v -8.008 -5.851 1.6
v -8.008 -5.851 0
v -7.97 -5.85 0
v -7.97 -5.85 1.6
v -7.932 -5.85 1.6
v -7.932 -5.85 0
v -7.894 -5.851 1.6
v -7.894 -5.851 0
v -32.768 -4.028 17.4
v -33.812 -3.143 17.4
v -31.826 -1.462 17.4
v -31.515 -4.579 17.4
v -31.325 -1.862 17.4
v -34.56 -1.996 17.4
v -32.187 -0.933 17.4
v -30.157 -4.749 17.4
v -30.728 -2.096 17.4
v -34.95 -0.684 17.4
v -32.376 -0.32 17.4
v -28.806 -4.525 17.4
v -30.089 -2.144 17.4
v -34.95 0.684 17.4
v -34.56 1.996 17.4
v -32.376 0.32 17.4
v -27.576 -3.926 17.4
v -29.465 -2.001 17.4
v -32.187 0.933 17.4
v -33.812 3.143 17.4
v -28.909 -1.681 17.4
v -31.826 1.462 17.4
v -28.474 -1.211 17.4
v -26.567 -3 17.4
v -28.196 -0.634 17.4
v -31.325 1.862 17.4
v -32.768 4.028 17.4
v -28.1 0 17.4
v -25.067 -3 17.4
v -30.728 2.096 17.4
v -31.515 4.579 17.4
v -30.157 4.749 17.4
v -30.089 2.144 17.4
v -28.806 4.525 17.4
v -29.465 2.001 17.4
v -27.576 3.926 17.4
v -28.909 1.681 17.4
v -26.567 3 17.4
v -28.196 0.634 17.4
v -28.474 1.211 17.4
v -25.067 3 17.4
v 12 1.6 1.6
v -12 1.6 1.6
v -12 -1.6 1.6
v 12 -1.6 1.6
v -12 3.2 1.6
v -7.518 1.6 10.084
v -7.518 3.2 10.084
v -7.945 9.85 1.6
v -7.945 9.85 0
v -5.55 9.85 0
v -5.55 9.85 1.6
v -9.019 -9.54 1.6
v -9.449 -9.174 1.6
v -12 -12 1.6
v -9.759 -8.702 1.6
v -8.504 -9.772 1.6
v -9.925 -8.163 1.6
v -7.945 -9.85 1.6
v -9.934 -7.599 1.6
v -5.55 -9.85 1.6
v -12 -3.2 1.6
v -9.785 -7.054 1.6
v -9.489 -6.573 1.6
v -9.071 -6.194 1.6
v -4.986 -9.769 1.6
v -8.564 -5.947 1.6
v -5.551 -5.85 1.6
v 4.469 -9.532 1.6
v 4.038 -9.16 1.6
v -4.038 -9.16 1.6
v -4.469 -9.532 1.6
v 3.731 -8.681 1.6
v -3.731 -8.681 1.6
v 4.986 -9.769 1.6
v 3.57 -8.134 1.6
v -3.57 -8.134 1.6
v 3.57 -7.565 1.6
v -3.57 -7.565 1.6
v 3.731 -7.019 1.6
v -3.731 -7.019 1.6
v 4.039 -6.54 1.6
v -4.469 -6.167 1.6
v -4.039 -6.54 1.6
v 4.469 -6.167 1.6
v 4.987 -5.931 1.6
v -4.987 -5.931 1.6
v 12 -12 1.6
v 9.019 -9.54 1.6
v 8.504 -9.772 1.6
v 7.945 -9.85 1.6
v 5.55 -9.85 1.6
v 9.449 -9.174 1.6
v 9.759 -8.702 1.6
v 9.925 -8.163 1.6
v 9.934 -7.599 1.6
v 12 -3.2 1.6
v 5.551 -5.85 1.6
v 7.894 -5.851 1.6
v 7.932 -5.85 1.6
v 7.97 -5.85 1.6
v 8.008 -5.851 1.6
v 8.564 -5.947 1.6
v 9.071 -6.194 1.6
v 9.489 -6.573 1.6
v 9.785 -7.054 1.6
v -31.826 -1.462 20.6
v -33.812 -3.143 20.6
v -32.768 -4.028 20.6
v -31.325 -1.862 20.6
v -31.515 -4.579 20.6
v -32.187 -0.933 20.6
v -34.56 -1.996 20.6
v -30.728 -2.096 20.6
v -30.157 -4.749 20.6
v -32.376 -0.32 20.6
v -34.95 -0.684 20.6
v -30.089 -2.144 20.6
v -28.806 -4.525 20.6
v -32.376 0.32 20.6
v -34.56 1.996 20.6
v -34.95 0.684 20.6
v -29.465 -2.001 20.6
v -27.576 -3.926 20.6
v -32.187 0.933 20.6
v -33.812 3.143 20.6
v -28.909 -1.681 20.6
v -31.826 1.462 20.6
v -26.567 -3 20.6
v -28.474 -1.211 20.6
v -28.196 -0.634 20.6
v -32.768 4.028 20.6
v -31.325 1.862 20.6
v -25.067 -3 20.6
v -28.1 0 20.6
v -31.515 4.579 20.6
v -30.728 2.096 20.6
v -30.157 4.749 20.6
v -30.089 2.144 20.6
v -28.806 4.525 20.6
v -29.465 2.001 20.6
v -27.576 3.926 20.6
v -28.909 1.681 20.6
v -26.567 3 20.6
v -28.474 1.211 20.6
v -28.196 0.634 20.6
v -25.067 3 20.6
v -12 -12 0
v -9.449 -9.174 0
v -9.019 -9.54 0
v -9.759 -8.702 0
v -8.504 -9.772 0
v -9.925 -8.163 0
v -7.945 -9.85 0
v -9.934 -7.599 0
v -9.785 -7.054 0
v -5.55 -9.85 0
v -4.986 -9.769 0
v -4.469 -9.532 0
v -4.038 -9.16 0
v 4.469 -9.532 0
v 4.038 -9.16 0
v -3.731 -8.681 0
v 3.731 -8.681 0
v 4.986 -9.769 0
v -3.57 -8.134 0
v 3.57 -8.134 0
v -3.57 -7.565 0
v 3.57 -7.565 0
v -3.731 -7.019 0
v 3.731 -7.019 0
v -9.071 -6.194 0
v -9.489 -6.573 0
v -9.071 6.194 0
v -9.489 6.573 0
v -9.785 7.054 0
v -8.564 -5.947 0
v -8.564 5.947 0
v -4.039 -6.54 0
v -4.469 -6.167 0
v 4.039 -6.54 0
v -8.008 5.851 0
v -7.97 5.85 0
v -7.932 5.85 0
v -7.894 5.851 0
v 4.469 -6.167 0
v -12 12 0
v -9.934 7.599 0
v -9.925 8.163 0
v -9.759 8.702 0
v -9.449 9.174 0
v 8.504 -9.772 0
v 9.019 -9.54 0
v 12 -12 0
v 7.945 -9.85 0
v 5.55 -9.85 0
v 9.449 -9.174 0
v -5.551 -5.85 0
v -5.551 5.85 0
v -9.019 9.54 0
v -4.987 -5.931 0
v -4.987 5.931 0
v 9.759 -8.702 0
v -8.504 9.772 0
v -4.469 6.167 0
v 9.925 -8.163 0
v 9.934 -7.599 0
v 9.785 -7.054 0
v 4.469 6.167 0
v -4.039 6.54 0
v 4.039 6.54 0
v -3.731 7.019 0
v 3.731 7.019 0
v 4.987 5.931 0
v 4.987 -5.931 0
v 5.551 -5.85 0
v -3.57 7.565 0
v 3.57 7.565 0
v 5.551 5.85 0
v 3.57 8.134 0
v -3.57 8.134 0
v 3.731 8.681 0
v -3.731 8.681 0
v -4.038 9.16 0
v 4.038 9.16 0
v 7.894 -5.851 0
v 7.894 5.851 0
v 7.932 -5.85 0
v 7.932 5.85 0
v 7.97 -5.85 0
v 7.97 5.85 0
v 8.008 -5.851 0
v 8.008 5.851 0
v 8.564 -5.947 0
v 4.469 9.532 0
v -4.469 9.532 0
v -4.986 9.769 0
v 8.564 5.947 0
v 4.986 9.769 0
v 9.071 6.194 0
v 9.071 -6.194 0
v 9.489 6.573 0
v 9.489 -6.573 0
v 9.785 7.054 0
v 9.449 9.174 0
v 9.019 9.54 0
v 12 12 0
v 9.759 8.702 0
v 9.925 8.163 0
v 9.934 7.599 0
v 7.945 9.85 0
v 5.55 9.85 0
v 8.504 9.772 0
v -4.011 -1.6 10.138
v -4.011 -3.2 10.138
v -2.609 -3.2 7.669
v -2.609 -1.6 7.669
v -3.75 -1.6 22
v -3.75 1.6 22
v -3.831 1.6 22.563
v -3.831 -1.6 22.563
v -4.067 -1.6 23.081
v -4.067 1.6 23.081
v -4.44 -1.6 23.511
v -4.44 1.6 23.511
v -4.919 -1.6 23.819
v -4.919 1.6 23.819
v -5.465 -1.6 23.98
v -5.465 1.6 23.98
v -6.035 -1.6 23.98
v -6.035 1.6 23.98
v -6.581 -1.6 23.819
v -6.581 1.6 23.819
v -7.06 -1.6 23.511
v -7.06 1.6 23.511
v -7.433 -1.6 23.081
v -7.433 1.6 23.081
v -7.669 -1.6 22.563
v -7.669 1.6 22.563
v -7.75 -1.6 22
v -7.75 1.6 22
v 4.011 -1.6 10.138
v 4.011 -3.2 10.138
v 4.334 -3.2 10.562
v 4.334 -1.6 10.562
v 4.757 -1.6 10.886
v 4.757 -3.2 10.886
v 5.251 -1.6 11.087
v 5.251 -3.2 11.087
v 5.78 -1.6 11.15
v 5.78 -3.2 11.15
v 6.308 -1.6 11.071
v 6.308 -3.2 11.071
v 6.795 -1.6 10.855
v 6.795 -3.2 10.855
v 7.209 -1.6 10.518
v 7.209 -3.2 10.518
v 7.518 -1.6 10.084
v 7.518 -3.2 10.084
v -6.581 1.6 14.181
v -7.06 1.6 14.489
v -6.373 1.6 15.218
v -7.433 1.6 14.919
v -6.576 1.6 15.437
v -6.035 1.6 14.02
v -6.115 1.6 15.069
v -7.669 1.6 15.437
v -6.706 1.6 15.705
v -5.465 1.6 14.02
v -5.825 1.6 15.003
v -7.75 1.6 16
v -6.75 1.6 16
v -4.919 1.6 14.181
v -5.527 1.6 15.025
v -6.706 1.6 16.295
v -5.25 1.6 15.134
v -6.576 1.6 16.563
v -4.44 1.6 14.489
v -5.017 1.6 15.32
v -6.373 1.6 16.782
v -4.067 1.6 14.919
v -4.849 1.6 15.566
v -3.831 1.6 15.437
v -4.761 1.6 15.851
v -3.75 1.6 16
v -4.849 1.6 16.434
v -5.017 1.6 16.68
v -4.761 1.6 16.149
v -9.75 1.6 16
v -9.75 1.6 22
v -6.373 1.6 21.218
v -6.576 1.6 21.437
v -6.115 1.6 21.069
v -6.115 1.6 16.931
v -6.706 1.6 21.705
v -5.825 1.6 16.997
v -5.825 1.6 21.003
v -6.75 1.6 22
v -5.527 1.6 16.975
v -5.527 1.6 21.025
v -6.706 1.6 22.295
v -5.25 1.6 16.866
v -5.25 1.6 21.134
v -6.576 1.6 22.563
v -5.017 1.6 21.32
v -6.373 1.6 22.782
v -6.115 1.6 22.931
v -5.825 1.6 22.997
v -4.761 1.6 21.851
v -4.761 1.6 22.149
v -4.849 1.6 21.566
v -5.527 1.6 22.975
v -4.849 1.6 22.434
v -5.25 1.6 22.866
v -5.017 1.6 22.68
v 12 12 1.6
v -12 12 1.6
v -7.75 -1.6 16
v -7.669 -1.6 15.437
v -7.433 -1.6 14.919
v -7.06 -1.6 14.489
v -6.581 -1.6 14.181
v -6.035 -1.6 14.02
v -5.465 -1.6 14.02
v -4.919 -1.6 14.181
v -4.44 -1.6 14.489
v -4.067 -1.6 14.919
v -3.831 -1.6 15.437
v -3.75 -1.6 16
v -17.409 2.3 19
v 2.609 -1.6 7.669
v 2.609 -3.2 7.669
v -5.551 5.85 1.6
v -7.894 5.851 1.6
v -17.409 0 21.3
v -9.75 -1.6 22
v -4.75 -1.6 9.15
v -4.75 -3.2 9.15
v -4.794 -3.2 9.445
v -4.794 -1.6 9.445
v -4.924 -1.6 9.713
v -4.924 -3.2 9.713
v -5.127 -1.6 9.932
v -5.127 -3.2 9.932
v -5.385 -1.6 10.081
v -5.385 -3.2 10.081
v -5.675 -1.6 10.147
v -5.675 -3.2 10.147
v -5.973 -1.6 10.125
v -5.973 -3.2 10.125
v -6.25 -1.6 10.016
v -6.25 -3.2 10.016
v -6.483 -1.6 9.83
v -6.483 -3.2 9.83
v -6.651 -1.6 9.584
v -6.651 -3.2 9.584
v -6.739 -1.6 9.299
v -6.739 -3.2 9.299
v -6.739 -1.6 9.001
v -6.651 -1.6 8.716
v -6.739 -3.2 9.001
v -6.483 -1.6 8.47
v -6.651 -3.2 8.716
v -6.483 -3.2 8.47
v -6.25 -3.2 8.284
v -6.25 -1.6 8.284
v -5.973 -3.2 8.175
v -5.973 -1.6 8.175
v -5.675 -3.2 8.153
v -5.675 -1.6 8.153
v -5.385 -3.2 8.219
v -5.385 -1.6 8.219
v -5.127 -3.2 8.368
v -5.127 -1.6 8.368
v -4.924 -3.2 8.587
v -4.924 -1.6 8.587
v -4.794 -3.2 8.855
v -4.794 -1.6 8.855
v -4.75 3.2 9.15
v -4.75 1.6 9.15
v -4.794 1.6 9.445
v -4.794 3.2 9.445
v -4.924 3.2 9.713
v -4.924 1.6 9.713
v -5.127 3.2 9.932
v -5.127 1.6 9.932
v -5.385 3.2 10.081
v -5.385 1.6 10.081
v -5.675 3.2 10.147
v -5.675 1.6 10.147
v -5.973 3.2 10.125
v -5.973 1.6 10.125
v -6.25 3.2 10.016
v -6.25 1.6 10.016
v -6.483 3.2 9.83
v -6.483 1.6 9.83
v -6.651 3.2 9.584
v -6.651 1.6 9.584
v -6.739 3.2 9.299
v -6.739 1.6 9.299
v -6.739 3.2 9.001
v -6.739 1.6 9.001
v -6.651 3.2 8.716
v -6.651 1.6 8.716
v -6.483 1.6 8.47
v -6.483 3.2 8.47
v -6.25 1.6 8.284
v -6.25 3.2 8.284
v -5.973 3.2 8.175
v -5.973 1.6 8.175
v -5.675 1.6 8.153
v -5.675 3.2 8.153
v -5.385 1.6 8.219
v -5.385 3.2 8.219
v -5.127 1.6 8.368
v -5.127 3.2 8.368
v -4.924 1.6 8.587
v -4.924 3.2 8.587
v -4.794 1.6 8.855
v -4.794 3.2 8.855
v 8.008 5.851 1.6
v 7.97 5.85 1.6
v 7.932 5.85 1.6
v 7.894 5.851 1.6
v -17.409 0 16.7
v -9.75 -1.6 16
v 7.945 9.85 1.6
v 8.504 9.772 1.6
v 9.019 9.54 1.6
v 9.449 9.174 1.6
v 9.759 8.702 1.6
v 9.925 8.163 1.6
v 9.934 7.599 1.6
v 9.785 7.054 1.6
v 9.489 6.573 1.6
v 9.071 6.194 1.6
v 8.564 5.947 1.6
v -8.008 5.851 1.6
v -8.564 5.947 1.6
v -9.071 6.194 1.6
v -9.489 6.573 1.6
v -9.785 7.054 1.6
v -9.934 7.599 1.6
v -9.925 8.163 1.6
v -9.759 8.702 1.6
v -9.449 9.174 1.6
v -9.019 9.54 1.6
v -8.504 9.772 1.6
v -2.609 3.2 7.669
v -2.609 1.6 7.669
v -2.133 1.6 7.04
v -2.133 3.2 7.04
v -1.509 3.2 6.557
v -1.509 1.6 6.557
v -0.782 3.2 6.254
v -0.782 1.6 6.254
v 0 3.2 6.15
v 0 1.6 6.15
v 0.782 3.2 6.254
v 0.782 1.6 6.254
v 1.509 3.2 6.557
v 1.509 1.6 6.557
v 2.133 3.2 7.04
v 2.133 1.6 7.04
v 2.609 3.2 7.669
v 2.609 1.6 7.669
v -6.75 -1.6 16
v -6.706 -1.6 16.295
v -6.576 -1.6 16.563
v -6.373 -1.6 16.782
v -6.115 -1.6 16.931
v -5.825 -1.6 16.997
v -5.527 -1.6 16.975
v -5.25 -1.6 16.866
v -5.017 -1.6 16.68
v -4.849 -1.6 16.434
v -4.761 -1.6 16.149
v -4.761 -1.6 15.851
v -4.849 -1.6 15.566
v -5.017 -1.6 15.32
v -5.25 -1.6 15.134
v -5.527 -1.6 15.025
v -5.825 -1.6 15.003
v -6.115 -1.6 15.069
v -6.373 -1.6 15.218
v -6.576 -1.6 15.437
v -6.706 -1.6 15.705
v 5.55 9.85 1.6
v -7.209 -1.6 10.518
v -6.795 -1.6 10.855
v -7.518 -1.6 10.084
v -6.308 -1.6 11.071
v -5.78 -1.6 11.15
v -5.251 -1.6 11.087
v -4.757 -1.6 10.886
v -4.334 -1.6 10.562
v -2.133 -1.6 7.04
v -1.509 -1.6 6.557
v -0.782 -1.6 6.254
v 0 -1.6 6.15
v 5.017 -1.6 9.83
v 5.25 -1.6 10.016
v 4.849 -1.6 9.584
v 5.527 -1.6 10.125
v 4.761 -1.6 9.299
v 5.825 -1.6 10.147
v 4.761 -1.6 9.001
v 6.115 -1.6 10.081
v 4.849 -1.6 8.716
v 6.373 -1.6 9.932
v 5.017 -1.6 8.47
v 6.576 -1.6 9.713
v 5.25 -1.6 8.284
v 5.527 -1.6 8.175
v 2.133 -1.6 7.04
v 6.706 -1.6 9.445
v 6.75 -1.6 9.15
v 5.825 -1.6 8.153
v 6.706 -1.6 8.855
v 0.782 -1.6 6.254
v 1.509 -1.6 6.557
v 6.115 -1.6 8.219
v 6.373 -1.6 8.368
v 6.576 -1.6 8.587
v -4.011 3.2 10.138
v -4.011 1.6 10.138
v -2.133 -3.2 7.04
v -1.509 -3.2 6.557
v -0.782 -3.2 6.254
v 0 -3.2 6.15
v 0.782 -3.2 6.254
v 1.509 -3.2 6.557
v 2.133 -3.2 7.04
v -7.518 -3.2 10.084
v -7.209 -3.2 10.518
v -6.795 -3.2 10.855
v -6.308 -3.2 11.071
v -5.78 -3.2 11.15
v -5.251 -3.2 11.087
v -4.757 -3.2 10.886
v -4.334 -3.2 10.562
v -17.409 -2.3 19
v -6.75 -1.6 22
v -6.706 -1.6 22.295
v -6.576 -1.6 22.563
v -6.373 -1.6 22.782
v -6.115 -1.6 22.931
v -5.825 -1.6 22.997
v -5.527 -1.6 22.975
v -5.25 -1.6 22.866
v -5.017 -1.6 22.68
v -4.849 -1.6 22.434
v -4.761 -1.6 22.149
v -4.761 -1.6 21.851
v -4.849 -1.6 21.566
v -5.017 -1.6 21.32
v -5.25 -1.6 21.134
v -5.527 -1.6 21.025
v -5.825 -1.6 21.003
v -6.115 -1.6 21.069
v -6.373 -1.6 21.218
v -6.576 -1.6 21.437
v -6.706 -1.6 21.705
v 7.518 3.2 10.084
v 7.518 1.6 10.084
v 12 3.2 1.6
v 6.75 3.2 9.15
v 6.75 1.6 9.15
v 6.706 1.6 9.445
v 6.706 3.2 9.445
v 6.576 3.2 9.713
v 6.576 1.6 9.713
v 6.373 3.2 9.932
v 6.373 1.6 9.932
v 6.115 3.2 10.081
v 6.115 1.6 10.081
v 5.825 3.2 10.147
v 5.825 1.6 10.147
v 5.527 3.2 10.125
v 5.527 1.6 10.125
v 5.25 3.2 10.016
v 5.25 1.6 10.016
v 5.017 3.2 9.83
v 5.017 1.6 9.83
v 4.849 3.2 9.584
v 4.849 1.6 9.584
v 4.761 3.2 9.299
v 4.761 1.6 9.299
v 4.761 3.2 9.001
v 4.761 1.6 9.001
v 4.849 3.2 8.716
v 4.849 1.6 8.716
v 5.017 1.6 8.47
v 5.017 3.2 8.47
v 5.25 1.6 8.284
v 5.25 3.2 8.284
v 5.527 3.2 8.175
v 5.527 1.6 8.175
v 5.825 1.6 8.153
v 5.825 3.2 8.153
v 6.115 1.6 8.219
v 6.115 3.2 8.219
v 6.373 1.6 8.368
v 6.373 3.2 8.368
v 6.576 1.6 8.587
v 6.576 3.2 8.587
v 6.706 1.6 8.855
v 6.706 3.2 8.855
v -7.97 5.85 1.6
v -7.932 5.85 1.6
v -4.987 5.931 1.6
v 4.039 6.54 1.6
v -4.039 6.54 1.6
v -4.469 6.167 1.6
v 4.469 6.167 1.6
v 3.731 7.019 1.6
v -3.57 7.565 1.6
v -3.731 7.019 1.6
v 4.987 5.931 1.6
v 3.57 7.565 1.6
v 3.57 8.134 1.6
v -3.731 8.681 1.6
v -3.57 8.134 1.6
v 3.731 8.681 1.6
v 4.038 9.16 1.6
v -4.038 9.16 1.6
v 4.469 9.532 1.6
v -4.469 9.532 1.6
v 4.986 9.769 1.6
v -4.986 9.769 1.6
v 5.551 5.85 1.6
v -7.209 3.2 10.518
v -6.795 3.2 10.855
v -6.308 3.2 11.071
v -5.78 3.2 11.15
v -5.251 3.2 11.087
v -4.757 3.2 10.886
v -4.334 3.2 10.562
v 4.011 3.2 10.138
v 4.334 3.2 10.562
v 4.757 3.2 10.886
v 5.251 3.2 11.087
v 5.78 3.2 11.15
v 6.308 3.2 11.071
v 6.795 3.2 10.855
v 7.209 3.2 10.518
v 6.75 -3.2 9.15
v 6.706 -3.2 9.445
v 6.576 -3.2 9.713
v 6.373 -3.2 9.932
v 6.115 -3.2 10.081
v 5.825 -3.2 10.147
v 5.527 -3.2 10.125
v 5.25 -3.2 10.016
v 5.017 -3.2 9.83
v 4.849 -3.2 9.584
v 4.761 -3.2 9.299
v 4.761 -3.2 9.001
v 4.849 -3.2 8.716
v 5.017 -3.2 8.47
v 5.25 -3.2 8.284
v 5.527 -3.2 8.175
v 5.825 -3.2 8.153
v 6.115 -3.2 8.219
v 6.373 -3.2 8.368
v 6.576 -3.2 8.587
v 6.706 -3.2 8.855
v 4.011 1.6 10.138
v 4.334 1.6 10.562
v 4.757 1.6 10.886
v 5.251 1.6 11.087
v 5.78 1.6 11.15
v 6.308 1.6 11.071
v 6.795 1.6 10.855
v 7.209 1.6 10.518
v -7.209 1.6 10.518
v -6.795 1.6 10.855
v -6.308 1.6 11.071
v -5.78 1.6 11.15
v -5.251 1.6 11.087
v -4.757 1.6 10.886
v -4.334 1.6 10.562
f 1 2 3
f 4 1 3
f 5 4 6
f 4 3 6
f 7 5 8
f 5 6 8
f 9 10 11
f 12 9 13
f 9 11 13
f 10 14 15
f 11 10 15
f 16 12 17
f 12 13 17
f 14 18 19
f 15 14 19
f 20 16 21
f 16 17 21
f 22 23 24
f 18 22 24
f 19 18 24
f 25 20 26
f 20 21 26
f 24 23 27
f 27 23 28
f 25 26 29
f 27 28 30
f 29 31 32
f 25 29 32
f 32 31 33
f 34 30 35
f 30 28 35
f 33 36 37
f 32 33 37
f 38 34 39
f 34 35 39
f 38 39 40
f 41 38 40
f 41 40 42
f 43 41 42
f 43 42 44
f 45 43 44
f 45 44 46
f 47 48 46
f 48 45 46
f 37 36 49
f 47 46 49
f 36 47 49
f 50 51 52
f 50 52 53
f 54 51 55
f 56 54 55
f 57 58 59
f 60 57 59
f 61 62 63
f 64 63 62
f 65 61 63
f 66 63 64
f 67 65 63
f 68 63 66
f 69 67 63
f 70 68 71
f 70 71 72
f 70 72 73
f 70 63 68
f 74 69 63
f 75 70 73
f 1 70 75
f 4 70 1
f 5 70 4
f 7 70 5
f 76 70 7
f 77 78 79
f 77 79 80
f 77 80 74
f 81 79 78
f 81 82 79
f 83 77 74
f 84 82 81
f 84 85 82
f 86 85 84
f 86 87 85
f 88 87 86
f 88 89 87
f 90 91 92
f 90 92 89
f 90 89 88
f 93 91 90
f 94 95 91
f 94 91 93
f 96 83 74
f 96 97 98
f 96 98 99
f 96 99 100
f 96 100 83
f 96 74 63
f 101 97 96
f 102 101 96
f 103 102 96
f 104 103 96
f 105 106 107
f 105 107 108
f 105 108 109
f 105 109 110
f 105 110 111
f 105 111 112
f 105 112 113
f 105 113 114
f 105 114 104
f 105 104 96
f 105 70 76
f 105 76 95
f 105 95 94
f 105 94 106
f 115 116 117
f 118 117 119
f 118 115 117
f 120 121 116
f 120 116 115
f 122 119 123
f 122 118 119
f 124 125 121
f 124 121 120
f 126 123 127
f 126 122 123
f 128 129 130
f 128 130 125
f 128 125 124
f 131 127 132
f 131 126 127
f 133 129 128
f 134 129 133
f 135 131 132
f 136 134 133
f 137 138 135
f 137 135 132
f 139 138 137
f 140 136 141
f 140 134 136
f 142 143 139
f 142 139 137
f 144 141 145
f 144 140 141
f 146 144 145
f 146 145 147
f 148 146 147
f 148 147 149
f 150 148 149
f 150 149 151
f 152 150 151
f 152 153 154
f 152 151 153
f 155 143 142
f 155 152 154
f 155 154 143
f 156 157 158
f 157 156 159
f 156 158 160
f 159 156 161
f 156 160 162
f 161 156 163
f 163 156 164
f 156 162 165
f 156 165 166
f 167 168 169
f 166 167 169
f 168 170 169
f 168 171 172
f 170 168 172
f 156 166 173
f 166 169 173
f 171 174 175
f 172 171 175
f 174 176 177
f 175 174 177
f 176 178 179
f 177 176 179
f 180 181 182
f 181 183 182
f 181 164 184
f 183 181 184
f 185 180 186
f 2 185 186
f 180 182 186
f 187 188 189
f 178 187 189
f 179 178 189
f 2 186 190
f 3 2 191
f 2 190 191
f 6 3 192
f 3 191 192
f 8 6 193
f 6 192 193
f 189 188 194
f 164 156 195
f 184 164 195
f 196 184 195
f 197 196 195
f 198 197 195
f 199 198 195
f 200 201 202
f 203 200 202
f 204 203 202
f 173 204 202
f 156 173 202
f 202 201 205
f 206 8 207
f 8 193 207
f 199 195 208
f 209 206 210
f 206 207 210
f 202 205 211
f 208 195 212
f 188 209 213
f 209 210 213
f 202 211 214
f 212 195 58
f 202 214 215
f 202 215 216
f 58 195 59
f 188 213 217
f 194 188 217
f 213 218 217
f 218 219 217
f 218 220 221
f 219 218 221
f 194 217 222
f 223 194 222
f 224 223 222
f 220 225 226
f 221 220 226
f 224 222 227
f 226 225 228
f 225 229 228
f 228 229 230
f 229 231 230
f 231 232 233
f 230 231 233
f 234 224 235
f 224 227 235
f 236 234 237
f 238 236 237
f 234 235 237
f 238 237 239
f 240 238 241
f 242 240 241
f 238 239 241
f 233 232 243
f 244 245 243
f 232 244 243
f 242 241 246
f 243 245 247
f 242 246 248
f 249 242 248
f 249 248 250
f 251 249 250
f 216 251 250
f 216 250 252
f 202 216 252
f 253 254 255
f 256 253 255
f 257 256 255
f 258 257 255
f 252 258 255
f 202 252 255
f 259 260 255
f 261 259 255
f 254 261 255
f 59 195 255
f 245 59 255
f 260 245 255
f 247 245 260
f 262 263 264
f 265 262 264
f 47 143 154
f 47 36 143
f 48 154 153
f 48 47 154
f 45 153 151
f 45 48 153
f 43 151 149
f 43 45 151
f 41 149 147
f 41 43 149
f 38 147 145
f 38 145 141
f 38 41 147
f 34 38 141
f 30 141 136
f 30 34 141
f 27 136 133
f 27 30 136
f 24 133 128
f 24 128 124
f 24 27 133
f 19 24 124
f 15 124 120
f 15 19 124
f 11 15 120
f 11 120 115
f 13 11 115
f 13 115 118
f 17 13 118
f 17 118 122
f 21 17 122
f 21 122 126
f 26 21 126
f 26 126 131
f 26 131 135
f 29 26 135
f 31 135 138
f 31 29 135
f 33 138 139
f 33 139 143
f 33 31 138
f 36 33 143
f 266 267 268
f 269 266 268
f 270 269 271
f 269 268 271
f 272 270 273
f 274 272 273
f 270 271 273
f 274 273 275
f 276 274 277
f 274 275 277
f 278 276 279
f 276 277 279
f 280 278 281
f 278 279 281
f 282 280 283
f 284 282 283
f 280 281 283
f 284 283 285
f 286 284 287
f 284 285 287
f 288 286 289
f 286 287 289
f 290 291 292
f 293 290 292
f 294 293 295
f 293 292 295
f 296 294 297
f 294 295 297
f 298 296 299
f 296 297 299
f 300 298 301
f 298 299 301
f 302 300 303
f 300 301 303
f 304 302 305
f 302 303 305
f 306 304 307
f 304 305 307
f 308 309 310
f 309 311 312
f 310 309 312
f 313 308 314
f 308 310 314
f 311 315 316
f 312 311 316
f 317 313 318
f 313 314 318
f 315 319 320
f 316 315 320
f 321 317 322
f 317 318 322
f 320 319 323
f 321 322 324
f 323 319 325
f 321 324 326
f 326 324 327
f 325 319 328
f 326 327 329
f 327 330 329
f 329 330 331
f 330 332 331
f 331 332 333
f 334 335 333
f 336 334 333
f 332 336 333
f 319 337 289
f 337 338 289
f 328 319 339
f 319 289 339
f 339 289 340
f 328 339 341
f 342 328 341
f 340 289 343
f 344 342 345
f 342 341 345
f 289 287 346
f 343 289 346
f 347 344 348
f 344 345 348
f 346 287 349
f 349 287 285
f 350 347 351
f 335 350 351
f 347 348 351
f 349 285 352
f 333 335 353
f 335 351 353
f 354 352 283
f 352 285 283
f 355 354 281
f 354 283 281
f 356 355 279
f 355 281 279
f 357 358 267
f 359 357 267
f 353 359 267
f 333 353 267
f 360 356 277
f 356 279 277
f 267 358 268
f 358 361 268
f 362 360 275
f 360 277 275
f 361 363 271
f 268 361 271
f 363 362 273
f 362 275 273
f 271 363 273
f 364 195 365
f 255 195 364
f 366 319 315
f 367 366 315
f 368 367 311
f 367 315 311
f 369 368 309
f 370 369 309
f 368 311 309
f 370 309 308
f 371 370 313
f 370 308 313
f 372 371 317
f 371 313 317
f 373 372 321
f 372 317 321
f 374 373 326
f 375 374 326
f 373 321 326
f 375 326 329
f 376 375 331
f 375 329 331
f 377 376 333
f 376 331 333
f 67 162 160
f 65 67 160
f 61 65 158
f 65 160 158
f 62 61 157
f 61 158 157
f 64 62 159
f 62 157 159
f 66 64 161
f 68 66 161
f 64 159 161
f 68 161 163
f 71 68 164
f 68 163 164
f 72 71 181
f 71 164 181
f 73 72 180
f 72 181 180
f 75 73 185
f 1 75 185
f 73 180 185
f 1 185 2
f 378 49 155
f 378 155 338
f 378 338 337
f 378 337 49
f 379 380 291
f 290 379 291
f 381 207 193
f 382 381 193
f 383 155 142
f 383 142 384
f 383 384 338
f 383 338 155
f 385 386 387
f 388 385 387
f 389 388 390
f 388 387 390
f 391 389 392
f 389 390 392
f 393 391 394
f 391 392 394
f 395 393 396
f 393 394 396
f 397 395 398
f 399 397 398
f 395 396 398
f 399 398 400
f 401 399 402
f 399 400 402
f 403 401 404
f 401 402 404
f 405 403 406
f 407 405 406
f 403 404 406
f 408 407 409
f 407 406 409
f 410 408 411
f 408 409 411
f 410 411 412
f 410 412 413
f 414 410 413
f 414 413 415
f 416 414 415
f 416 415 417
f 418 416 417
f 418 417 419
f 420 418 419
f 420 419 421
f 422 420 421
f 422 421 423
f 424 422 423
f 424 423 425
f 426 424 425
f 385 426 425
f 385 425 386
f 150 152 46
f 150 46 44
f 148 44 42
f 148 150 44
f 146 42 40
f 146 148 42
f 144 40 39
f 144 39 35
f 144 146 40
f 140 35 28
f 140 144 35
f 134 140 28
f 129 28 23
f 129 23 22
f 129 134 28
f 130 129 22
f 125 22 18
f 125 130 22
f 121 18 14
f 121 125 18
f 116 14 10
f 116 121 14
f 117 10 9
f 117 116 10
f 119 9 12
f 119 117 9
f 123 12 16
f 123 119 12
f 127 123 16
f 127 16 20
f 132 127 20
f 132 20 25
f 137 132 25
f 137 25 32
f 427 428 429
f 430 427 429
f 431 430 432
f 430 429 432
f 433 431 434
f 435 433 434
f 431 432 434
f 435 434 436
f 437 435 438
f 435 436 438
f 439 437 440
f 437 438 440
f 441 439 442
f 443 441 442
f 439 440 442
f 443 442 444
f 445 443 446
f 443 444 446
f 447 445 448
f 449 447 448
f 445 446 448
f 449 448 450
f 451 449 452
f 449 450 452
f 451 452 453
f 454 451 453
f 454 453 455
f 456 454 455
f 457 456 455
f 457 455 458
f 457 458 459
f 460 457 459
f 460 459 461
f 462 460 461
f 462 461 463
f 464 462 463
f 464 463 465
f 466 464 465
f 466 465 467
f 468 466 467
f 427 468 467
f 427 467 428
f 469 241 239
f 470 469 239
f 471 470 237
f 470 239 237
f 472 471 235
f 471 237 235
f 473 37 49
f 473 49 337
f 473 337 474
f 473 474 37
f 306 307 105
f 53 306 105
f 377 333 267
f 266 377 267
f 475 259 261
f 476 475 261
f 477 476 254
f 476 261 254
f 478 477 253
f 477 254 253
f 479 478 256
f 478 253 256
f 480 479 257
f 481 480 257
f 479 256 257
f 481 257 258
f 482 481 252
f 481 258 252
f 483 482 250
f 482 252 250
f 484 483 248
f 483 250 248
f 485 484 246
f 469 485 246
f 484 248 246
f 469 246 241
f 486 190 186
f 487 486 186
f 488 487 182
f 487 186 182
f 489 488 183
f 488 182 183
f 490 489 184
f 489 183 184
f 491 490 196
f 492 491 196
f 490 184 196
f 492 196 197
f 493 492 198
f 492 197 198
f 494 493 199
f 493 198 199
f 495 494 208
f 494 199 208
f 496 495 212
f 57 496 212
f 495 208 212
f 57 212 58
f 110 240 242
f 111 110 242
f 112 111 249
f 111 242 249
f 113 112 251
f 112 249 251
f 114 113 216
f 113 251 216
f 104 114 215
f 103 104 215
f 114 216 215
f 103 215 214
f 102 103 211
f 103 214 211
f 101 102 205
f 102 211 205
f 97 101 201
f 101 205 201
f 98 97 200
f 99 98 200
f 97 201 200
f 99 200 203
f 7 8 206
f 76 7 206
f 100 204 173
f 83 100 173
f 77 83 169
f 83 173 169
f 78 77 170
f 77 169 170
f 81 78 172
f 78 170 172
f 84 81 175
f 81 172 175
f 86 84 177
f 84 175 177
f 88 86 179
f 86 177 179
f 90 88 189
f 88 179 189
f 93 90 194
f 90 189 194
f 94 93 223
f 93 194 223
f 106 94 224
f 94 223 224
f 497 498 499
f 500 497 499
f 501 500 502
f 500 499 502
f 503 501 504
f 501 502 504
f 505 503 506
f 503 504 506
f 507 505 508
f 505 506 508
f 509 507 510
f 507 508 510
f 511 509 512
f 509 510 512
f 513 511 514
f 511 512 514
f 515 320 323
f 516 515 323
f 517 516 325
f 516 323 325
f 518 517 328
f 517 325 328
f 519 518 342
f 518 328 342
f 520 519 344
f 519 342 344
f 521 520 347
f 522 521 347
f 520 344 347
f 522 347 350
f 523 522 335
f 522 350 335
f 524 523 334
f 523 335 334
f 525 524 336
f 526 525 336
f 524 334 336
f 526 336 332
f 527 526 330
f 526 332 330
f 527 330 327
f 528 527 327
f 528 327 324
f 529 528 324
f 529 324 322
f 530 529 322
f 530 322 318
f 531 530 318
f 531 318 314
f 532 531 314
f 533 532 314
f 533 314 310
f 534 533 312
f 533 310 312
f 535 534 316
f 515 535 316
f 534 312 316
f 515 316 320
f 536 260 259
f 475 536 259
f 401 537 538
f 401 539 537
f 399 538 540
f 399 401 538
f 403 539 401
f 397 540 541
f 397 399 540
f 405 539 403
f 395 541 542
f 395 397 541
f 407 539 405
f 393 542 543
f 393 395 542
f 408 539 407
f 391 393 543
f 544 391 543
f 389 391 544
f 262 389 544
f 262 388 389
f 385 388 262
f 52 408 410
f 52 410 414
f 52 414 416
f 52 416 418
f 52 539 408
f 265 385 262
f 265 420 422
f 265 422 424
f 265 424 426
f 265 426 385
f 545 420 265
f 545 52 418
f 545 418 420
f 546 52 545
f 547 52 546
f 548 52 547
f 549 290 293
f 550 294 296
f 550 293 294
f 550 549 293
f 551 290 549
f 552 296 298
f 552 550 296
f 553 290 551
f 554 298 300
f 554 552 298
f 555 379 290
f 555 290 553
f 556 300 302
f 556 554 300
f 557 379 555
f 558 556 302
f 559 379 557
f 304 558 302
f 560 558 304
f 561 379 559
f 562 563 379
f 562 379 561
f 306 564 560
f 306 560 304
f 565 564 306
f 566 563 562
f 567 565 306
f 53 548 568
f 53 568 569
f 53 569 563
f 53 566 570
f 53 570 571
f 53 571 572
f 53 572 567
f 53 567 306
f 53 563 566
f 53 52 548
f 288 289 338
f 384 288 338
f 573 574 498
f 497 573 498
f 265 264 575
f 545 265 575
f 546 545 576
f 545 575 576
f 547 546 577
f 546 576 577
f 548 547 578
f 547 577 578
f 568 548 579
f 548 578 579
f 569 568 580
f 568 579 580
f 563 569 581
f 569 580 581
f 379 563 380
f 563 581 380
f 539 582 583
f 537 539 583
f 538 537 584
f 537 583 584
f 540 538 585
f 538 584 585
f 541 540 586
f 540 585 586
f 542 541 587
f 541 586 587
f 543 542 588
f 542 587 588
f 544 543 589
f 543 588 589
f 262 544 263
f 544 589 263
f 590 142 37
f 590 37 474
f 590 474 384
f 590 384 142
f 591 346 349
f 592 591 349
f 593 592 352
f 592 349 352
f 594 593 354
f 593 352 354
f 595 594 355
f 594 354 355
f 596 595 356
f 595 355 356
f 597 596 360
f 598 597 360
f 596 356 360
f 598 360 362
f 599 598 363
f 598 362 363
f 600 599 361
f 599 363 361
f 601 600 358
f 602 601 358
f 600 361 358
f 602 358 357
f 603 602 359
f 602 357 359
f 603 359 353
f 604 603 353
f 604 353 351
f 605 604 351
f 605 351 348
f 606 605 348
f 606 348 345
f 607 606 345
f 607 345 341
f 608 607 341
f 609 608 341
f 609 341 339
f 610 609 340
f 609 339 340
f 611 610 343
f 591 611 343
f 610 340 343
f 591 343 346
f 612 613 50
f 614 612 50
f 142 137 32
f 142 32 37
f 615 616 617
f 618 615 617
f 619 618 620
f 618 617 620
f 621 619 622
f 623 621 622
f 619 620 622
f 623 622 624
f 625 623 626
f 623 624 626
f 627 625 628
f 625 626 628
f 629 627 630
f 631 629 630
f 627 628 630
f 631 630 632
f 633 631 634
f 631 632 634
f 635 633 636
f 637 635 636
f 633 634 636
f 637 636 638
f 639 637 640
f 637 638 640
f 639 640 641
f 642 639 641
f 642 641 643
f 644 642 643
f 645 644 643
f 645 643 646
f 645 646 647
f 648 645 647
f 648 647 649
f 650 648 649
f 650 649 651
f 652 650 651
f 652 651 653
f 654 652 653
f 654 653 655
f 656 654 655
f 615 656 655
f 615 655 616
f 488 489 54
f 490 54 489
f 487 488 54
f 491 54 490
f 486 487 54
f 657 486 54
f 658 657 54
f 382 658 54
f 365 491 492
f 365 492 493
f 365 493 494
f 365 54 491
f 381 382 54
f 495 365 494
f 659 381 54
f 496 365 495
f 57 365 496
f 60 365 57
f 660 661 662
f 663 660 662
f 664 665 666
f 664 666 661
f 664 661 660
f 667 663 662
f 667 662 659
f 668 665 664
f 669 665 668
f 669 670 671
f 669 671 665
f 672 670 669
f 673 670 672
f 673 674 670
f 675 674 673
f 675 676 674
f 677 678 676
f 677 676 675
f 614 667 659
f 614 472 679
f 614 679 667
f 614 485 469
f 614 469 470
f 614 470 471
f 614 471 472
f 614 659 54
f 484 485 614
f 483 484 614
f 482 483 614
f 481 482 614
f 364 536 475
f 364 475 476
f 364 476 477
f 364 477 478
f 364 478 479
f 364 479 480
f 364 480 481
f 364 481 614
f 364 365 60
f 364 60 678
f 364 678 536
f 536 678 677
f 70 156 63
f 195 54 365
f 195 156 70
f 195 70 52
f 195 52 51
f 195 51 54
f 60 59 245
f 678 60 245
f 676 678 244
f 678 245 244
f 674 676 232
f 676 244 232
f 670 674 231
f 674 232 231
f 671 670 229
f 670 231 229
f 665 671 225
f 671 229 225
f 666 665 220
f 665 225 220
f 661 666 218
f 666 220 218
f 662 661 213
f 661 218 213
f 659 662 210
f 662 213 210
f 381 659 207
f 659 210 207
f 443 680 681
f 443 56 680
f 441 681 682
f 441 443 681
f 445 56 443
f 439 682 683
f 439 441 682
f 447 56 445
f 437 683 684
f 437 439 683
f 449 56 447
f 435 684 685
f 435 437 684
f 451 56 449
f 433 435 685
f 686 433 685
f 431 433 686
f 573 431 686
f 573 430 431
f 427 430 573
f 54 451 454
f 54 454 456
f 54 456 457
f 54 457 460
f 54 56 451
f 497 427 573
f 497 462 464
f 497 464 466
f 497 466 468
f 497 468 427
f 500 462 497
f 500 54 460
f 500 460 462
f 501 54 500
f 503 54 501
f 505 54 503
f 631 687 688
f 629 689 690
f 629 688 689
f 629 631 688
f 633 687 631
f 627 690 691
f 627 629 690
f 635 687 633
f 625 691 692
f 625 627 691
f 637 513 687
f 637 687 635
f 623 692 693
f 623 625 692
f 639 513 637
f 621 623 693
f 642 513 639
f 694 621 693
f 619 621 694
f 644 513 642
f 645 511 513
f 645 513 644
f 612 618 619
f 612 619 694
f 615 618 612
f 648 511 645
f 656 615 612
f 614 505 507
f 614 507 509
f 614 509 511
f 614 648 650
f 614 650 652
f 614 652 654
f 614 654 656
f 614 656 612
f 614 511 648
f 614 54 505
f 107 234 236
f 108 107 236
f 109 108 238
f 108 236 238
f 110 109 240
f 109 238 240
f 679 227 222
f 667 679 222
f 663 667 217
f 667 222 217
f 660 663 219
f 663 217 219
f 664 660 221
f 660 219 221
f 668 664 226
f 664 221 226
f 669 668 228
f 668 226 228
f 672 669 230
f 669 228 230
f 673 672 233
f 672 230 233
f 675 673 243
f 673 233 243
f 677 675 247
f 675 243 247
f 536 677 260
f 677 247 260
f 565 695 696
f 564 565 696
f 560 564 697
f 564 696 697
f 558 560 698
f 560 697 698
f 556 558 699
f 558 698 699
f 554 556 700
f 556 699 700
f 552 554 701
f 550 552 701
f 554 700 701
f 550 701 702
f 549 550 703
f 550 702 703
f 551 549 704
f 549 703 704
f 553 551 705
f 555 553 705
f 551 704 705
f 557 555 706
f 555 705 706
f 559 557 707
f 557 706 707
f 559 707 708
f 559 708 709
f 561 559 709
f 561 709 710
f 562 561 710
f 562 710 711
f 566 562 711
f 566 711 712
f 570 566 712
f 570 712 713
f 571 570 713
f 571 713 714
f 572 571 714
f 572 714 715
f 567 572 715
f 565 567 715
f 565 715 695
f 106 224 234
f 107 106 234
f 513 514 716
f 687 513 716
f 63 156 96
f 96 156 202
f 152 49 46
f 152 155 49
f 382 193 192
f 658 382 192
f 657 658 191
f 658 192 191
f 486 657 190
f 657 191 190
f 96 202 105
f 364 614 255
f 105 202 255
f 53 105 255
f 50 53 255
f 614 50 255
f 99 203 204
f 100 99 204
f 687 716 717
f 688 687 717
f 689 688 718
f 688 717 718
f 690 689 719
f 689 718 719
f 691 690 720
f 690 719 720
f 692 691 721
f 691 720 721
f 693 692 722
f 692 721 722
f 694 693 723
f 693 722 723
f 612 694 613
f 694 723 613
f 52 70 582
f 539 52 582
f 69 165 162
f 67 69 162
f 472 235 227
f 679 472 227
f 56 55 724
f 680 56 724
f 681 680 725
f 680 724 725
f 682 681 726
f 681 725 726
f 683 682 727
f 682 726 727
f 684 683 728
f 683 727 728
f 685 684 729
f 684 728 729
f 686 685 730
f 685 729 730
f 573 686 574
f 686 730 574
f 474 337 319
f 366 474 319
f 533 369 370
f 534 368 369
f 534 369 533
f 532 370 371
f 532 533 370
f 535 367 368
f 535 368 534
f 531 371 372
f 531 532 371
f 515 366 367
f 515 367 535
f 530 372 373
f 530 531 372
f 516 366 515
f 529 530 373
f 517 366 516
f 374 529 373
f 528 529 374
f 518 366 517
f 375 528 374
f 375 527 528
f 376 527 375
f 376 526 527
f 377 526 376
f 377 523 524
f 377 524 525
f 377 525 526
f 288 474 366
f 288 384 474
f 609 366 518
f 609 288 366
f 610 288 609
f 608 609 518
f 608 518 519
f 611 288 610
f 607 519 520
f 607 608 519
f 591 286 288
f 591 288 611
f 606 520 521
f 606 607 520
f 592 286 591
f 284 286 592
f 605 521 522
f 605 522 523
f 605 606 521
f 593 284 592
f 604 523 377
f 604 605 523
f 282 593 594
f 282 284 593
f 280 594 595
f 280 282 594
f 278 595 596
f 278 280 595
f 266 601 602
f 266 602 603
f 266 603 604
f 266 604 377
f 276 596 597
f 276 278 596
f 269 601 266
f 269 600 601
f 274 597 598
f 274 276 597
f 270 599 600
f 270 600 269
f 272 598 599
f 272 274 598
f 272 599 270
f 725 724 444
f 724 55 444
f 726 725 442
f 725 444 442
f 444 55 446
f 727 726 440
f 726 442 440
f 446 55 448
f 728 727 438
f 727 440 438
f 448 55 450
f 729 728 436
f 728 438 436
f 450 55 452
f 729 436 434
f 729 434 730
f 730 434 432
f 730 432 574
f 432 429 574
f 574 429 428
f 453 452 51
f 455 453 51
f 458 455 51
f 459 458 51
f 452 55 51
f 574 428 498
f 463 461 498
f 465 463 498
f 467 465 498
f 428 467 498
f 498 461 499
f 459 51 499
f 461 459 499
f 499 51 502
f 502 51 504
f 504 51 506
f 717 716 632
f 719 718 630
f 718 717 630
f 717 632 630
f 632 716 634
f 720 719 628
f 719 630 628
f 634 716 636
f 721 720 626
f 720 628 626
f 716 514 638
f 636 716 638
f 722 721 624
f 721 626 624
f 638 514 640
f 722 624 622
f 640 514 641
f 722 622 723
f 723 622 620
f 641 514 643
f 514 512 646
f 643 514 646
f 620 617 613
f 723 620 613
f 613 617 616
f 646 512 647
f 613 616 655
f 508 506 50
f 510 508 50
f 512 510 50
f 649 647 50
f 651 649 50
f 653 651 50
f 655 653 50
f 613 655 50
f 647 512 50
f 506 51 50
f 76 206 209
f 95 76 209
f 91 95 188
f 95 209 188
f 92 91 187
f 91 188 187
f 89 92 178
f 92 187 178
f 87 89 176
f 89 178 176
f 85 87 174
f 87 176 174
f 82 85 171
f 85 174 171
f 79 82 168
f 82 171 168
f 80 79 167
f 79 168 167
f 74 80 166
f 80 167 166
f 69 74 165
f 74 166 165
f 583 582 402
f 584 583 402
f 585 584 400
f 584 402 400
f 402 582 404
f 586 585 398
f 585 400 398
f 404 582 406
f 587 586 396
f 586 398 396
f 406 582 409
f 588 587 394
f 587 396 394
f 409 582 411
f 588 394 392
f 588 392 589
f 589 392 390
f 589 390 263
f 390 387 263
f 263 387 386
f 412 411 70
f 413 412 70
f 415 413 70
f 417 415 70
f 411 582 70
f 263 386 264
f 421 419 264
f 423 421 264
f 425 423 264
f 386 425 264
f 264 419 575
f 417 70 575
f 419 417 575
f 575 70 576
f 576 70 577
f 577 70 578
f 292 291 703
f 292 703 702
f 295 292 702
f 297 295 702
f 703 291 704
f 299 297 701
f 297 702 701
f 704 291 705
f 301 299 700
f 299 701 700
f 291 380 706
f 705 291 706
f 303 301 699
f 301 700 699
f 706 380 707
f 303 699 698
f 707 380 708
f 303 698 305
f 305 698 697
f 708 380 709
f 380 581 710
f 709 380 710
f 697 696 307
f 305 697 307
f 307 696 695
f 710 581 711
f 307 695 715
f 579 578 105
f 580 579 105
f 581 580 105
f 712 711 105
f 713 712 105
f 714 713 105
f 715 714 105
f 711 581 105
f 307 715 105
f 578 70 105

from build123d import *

# Parameters (mm, degrees)
F0_W       = 24
F0_H       = 24
F1_DEPTH   = 1.6
F2_W       = 24
F2_H       = 1.6
F3_DEPTH   = 15.5
F4_R       = 1
F5_DEPTH   = 15.201
F7_DEPTH   = 3.2
F9_R       = 2.15
F10_DEPTH  = 1.6
F10_FACE_W = 6
F10_FACE_H = 3.2
F7_FACE_W  = 3.2
F7_FACE_H  = 6


with BuildPart() as f1:
    # F0 (on Top) → F1 (new body)
    with BuildSketch(Plane.XY):
        Rectangle(F0_W, F0_H)
        with BuildLine():
            ThreePointArc((-5.5506757605, -5.8500001142), (-3.5500000282, -7.84966427), (-5.5500043004, -9.85))
            Line((-5.5500043004, -9.85), (-7.9454609594, -9.8499948493))
            ThreePointArc((-7.9454609594, -9.8499948493), (-9.9497584372, -7.8810836398), (-8.007622763, -5.850830268))
            ThreePointArc((-8.007622763, -5.850830268), (-7.9506757605, -5.8500001142), (-7.8937282099, -5.8507917853))
            Line((-7.8937282099, -5.8507917853), (-5.5506757605, -5.8500001142))
        make_face(mode=Mode.SUBTRACT)
        with BuildLine():
            ThreePointArc((7.8937282099, -5.8507917853), (7.9506757605, -5.8500001142), (8.007622763, -5.850830268))
            ThreePointArc((8.007622763, -5.850830268), (9.9497584372, -7.8810836398), (7.9454609594, -9.8499948493))
            Line((7.9454609594, -9.8499948493), (5.5500043004, -9.85))
            ThreePointArc((5.5500043004, -9.85), (3.5500000282, -7.84966427), (5.5506757605, -5.8500001142))
            Line((5.5506757605, -5.8500001142), (7.8937282099, -5.8507917853))
        make_face(mode=Mode.SUBTRACT)
        with BuildLine():
            ThreePointArc((-7.8937282099, 5.8507917853), (-7.9506757605, 5.8500001142), (-8.007622763, 5.850830268))
            ThreePointArc((-8.007622763, 5.850830268), (-9.9497584372, 7.8810836398), (-7.9454609594, 9.8499948493))
            Line((-7.9454609594, 9.8499948487), (-5.5500043004, 9.8499999994))
            ThreePointArc((-5.5500043004, 9.85), (-3.5500000282, 7.84966427), (-5.5506757605, 5.8500001142))
            Line((-5.5506757605, 5.8500001142), (-7.8937282099, 5.8507917853))
        make_face(mode=Mode.SUBTRACT)
        with BuildLine():
            ThreePointArc((5.5506757605, 5.8500001142), (3.5500000282, 7.84966427), (5.5500043004, 9.85))
            Line((5.5500043004, 9.8499999994), (7.9454609594, 9.8499948487))
            ThreePointArc((7.9454609594, 9.8499948493), (9.9497584372, 7.8810836398), (8.007622763, 5.850830268))
            ThreePointArc((8.007622763, 5.850830268), (7.9506757605, 5.8500001142), (7.8937282099, 5.8507917853))
            Line((7.8937282099, 5.8507917853), (5.5506757605, 5.8500001142))
        make_face(mode=Mode.SUBTRACT)
    extrude(amount=F1_DEPTH)

    # F2 (on face) → F3 (join)
    with BuildSketch(Plane.XY.offset(1.6)):
        with Locations((0, -2.4)):
            Rectangle(F2_W, F2_H)
        with Locations((0, 2.4)):
            Rectangle(F2_W, F2_H)
    extrude(amount=F3_DEPTH)

    # F4 (on face) → F5 (cut, through all)
    with BuildSketch(Plane.XZ.offset(3.2)):
        with BuildLine():
            ThreePointArc((-7.5184408181, 10.0841397501), (-5.7804998867, 11.1497674257), (-4.0108695652, 10.1376362341))
            Line((-4.0108695652, 10.1376362341), (-2.6086956522, 7.6685456489))
            ThreePointArc((-2.6086956522, 7.6685456489), (0, 6.15), (2.6086956522, 7.6685456489))
            Line((2.6086956522, 7.6685456489), (4.0108695652, 10.1376362341))
            ThreePointArc((4.0108695652, 10.1376362341), (5.7804998867, 11.1497674257), (7.5184408181, 10.0841397501))
            Line((7.5184408181, 10.0841397501), (12, 1.6))
            Line((12, 1.6), (12, 17.1))
            Line((12, 17.1), (-12, 17.1))
            Line((-12, 17.1), (-12, 1.6))
            Line((-12, 1.6), (-7.5184408181, 10.0841397501))
        make_face()
        with Locations((5.75, 9.15)):
            Circle(F4_R)
        with Locations((-5.75, 9.15)):
            Circle(F4_R)
    extrude(amount=-F5_DEPTH, mode=Mode.SUBTRACT)


with BuildPart() as f7:
    # F6 (on face) → F7 (new body)
    with BuildSketch(Plane.XZ.offset(-1.6)):
        with BuildLine():
            Line((-9.75, 16), (-7.75, 16))
            ThreePointArc((-7.75, 16), (-5.75, 14), (-3.75, 16))
            Line((-3.75, 16), (-3.75, 22))
            ThreePointArc((-3.75, 22), (-5.75, 24), (-7.75, 22))
            Line((-7.75, 22), (-9.75, 22))
            Line((-9.75, 22), (-9.75, 16))
        make_face()
        with BuildLine():
            ThreePointArc((-4.75, 16), (-5.75, 15), (-6.75, 16))
            ThreePointArc((-6.75, 16), (-5.75, 17), (-4.75, 16))
        make_face(mode=Mode.SUBTRACT)
        with BuildLine():
            ThreePointArc((-4.75, 22), (-5.75, 21), (-6.75, 22))
            ThreePointArc((-6.75, 22), (-5.75, 23), (-4.75, 22))
        make_face(mode=Mode.SUBTRACT)
    extrude(amount=F7_DEPTH)



with BuildPart() as f10:
    # F9 (on offset) → F10 (new body, symmetric)
    with BuildSketch(Plane.XY.offset(19)):
        with BuildLine():
            Line((-25.0672700343, 3), (-26.5672700343, 3))
            ThreePointArc((-26.5672700343, 3), (-35, 0), (-26.5672700343, -3))
            Line((-26.5672700343, -3), (-25.0672700343, -3))
            Line((-25.0672700343, -3), (-25.0672700343, 3))
        make_face()
        with Locations((-30.25, 0)):
            Circle(F9_R, mode=Mode.SUBTRACT)
    extrude(amount=F10_DEPTH, both=True)


with BuildPart() as f7_1:
    add(f7.part)

    add(f10.part)  # F11 merges F10
    # F10_face (on face) → F11 section 0
    with BuildSketch(Plane(origin=(-25.0672700343, 0, 19), x_dir=(0, 1, 0), z_dir=(1, 0, 0))):
        Rectangle(F10_FACE_W, F10_FACE_H)
    # F7_face (on face) → F11 section 1
    with BuildSketch(Plane(origin=(-9.75, 0, 19), x_dir=(0, -1, 0), z_dir=(-1, 0, 0))):
        Rectangle(F7_FACE_W, F7_FACE_H)
    loft()


solid = Compound([f1.part, f7_1.part])
